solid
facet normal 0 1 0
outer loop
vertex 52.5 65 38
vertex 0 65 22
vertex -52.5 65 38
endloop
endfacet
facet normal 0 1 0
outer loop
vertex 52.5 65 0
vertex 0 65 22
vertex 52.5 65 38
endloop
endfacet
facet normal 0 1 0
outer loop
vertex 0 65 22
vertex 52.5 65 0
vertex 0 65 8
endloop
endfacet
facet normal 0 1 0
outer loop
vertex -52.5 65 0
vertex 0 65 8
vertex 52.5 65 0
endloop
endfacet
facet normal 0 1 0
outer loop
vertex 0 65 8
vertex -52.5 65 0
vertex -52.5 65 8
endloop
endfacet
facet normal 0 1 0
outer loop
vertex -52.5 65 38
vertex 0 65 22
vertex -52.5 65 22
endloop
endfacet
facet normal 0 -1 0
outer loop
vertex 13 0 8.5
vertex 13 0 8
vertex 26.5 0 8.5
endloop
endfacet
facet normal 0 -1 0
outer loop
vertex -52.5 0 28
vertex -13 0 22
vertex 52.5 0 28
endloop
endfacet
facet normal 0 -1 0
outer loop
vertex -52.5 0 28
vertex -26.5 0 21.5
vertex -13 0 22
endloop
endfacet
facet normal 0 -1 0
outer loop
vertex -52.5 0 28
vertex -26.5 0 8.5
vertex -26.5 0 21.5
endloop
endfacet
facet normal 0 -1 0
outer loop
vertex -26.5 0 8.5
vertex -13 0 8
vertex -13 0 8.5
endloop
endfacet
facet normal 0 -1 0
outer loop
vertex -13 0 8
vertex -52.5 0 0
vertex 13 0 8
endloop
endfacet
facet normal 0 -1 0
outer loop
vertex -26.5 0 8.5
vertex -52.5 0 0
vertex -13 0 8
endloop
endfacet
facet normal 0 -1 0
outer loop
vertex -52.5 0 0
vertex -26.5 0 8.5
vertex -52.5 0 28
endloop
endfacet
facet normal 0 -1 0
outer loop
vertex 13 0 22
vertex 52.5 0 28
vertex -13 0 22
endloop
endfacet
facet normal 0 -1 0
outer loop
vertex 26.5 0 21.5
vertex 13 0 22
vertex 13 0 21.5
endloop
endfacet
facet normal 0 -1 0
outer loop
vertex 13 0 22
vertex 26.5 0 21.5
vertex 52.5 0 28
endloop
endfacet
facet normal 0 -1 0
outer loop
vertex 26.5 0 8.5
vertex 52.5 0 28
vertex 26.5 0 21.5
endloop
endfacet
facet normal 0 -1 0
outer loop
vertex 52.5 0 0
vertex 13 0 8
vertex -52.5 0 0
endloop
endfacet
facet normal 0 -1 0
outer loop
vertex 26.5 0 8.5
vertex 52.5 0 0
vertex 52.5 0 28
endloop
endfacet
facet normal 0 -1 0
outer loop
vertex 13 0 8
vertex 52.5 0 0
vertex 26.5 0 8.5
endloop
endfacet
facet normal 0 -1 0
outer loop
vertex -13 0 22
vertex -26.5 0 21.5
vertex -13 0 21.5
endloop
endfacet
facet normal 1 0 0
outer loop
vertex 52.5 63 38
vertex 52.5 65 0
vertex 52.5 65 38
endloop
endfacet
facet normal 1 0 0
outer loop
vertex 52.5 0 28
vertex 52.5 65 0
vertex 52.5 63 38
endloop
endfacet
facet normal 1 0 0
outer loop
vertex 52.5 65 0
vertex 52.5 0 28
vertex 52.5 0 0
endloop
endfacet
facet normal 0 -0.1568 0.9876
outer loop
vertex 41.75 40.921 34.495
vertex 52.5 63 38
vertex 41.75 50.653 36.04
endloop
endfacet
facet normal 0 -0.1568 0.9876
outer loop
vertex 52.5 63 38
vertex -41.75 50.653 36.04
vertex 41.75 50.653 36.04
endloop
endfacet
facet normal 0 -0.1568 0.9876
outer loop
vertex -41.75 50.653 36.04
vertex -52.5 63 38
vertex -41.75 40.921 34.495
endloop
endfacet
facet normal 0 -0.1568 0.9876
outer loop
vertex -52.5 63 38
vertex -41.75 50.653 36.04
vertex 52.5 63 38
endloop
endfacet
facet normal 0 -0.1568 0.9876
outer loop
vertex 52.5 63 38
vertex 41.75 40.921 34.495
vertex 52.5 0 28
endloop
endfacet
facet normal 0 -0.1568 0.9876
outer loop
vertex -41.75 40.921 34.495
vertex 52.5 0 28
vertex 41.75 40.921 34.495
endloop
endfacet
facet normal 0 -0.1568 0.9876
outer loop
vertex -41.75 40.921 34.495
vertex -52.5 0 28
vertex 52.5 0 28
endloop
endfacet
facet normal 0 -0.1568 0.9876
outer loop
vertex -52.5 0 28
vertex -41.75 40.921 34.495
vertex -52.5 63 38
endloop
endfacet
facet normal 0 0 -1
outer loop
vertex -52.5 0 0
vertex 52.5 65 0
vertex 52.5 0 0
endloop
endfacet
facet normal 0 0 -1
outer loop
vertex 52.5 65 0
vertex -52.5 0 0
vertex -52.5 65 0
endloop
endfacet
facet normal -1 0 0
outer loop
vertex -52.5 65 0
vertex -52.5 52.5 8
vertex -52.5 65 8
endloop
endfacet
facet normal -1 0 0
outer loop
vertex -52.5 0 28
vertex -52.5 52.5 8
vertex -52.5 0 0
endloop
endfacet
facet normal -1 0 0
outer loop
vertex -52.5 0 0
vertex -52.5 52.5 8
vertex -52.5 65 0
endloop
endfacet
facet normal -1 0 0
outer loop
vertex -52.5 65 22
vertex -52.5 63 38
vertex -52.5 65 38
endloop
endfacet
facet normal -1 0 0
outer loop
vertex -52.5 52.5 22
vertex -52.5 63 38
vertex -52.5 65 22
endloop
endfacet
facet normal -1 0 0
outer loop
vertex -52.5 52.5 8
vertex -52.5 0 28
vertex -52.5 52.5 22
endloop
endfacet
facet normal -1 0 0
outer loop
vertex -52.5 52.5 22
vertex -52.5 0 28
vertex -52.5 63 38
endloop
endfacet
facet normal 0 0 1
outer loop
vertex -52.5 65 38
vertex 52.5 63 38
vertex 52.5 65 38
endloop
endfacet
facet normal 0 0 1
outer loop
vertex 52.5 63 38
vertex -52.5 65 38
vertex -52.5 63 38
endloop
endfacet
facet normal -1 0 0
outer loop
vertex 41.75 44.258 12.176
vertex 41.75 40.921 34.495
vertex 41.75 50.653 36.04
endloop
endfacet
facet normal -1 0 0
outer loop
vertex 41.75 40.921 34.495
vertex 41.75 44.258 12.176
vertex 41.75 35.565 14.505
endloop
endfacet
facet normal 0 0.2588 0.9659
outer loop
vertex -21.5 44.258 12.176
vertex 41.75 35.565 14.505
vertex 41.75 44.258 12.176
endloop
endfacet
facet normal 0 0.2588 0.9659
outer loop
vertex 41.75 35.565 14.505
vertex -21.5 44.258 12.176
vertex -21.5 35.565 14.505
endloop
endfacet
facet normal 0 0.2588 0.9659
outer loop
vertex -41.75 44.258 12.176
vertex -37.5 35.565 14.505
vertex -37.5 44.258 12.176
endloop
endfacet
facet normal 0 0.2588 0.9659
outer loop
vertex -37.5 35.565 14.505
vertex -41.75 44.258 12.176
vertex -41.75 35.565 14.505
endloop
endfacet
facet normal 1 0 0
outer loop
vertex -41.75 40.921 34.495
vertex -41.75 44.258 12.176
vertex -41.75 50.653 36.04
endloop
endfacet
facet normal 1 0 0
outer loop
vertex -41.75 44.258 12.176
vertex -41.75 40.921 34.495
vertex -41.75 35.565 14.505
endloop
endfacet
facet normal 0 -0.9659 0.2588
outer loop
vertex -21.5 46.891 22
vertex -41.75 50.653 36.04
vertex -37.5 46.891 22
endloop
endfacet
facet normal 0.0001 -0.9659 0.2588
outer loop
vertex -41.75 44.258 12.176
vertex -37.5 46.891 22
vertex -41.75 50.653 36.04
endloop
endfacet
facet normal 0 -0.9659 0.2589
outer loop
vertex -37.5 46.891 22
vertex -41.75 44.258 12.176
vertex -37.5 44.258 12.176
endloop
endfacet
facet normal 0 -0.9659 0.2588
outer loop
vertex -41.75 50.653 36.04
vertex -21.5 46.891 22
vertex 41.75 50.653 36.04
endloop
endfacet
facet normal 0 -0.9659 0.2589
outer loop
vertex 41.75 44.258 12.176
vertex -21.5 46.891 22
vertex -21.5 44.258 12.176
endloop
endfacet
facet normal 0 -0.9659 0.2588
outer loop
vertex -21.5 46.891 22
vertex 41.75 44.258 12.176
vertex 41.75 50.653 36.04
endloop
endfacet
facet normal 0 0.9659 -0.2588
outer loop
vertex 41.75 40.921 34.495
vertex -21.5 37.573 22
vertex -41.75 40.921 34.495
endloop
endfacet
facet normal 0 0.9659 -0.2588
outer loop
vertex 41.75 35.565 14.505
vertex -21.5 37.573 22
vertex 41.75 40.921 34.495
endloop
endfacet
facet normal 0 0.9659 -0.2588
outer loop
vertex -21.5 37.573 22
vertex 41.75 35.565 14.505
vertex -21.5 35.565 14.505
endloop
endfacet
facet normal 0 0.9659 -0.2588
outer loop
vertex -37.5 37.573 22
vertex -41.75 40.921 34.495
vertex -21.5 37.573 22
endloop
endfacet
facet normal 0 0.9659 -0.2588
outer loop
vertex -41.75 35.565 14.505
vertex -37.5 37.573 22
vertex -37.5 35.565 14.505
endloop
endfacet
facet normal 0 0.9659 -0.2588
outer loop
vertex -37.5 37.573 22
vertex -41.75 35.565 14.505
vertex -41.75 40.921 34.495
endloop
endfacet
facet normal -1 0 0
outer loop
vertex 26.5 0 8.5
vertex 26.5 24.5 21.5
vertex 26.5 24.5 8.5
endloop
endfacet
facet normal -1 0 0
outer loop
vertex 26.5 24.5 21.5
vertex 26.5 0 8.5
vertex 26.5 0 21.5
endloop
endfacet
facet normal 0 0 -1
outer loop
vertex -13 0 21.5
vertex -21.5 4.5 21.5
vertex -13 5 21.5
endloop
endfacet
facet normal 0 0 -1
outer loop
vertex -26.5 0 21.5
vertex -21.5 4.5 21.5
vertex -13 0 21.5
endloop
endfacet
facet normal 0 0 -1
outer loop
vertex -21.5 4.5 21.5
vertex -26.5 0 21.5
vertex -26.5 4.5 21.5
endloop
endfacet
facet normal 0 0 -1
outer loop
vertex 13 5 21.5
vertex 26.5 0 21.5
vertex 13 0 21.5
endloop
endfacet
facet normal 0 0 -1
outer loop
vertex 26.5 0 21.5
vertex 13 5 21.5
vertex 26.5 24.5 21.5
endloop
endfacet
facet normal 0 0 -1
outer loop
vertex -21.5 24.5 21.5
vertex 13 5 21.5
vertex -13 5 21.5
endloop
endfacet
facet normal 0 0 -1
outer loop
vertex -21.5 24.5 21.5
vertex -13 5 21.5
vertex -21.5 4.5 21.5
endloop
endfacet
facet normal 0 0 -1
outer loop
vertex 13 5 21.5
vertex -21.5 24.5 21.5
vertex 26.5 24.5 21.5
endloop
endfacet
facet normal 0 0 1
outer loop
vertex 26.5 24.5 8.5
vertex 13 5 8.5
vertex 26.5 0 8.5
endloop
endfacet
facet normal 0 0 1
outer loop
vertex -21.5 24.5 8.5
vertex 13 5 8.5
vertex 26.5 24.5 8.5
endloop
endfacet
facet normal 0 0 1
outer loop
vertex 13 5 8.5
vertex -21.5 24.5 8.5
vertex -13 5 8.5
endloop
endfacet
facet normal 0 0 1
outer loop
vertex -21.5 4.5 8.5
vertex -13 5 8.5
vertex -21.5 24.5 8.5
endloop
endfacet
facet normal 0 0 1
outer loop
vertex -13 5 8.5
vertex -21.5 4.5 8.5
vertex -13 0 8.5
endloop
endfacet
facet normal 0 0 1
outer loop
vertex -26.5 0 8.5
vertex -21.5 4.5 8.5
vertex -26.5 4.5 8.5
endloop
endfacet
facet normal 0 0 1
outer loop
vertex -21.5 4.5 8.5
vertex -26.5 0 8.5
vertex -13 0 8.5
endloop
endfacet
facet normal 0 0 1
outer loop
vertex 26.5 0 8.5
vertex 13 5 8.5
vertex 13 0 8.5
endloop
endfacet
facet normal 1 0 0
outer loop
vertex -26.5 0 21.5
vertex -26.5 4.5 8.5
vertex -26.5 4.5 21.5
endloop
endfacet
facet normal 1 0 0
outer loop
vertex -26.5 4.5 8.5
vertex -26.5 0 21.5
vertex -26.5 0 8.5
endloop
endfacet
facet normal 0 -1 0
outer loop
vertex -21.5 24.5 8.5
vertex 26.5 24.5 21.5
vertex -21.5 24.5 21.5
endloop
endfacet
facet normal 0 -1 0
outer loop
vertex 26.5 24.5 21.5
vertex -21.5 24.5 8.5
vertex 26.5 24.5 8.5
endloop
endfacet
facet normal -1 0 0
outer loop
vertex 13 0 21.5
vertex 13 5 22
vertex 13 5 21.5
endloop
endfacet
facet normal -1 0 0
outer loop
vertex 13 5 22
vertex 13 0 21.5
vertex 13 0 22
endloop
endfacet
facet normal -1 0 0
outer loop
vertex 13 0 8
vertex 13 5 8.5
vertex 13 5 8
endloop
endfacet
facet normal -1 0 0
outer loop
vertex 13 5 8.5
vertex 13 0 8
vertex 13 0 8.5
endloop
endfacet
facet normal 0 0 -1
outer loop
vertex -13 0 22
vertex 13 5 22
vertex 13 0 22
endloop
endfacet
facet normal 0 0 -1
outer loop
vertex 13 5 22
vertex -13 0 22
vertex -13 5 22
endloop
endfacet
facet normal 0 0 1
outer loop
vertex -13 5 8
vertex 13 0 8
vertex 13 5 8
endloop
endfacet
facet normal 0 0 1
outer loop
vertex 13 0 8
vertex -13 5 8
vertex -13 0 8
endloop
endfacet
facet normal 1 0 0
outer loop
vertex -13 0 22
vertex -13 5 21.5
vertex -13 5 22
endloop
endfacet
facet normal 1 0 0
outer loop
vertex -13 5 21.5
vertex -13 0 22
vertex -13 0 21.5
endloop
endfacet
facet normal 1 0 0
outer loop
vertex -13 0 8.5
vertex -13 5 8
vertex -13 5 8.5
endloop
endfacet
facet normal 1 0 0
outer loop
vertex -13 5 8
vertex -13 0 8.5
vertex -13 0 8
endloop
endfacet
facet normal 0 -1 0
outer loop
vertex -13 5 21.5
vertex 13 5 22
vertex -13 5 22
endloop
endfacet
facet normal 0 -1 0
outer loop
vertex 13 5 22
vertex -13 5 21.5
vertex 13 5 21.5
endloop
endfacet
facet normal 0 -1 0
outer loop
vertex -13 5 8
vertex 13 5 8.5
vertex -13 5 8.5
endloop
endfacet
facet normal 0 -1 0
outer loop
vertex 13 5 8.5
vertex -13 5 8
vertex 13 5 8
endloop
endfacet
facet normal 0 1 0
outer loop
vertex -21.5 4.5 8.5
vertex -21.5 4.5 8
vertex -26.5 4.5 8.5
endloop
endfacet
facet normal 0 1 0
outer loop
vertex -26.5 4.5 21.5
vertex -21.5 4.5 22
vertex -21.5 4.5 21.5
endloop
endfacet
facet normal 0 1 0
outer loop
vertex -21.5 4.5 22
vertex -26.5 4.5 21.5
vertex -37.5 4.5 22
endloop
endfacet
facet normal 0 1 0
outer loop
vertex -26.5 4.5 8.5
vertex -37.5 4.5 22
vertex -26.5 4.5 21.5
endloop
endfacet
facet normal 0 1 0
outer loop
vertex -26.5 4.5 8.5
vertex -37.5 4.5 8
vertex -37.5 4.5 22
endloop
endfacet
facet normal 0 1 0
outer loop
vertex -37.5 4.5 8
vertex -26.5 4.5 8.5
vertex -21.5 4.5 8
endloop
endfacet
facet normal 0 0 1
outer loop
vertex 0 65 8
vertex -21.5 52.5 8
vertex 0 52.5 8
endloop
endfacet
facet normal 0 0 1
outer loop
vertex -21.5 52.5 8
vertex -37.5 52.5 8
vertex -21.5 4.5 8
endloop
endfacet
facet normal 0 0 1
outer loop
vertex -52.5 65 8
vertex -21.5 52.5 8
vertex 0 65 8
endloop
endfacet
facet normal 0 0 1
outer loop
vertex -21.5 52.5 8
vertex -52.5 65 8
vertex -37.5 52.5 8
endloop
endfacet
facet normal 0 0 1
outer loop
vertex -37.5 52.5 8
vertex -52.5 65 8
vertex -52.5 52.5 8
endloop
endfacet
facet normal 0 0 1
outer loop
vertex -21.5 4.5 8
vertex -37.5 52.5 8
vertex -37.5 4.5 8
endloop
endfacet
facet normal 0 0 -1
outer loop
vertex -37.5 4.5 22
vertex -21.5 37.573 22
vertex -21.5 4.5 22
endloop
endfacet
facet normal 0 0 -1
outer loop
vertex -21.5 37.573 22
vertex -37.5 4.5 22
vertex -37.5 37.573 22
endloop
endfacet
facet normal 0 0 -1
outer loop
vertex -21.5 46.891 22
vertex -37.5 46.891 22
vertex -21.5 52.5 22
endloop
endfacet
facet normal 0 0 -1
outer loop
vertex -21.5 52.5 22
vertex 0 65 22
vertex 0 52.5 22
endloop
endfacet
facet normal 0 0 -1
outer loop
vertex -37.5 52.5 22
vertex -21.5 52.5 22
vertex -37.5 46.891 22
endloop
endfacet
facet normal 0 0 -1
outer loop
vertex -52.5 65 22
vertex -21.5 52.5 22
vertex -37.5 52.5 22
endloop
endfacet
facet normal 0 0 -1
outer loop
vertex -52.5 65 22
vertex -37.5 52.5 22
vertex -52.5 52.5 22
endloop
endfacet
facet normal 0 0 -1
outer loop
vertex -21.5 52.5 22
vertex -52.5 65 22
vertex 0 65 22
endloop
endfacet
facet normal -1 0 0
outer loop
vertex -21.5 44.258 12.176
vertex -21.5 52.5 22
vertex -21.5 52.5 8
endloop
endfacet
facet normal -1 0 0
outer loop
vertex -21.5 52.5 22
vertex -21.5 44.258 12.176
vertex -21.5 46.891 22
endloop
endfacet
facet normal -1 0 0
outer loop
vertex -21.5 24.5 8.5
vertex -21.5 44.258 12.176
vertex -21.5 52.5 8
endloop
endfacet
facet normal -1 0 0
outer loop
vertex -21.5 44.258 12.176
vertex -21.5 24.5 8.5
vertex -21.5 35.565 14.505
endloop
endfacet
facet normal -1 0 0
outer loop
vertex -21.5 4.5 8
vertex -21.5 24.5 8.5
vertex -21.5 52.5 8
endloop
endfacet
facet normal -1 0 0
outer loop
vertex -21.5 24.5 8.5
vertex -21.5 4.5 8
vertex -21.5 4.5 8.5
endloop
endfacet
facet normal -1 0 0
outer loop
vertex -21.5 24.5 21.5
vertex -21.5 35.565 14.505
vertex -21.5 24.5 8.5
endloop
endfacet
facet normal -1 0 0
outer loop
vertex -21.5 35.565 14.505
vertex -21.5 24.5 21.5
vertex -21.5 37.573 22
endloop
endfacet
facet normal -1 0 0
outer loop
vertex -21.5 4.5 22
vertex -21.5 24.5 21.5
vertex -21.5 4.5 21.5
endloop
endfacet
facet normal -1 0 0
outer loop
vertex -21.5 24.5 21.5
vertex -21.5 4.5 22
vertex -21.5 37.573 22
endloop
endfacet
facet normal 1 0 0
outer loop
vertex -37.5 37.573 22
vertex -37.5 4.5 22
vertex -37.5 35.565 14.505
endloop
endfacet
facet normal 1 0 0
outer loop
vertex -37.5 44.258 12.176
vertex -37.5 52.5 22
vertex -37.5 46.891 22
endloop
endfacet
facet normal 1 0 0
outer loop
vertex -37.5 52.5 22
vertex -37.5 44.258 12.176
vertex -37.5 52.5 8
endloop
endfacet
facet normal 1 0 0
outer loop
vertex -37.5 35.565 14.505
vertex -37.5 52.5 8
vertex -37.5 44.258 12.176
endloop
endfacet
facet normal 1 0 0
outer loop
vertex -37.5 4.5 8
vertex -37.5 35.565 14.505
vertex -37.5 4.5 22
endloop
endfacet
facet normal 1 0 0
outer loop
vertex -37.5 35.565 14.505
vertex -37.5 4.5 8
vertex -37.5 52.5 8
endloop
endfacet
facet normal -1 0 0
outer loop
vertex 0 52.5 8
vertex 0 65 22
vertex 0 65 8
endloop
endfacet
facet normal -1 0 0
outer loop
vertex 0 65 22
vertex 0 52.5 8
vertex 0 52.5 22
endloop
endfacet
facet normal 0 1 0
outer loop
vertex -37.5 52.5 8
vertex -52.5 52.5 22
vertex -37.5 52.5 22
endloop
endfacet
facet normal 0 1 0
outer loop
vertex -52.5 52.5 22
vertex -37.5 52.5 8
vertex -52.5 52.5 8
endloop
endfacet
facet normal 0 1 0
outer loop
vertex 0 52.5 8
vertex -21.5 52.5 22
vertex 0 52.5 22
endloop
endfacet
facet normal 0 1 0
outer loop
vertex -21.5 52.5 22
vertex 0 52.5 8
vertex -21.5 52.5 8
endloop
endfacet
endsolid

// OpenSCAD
/*
    💎 GradMon Case v3.0
    Minimal, support-free stand for PSA/BGS graded cards.
    Features an open "Side Corridor" for easy USB cable management.
*/

// --- SETTINGS ---
$fn = 64;

// Card dimensions (Slabs)
card_width = 83.5;
card_depth = 9.0;    
card_height_vis = 25; 

// ESP32 Module (Heltec WiFi Kit 32 V3)
esp_w = 51.0;
esp_d = 26.5;
esp_h = 11.0;
oled_w = 26.0;
oled_h = 14.0;

// USB Corridor dimensions
corridor_w = 16; 
corridor_h = 14;

// Base dimensions
base_w = 105;
base_d = 65;
base_h = 38;
angle = 15; 

module case() {
    difference() {
        // --- 1. EXTERNAL SHELL ---
        union() {
            hull() {
                // Front slanted face
                translate([-base_w/2, 0, 0]) cube([base_w, 2, 28]);
                // Back face
                translate([-base_w/2, base_d-2, 0]) cube([base_w, 2, base_h]);
                // Bottom plate
                translate([-base_w/2, 0, 0]) cube([base_w, base_d, 2]);
            }
        }

        // --- 2. CARD SLOT ---
        // Slanted slot to hold the slab
        translate([0, base_d/2 + 10, base_h - card_height_vis + 10])
        rotate([-angle, 0, 0])
        translate([-card_width/2, -card_depth/2, -10])
        cube([card_width, card_depth, 100]);

        // --- 3. ESP32 CAVITY & OLED WINDOW ---
        // Main cavity for the board
        translate([0, 12, 15])
        cube([esp_w + 2, 25, esp_h + 2], center=true);
        
        // Window for the OLED screen
        translate([0, -5, 15])
        cube([oled_w, 20, oled_h], center=true);

        // --- 4. USB "CORRIDOR" ---
        // Cutout from the side port (left) straight to the back
        hull() {
            // Starting at the port location (left end of board)
            translate([-esp_w/2 - corridor_w/4, 12, 15])
            cube([corridor_w, 15, corridor_h], center=true);
            
            // Ending at the rear face
            translate([-esp_w/2 - corridor_w/4, base_d, 15])
            cube([corridor_w, 1, corridor_h], center=true);
        }
        
        // Extra clearance for the cable bend at the back
        translate([-base_w/4, base_d-5, 15])
        cube([base_w/2, 15, corridor_h], center=true);
    }
}

case();

// --- PRINTING INFO ---
/*
    - Support: NOT REQUIRED
    - Orientation: Print on bottom face (as oriented in OpenSCAD)
    - Infill: 15%
    - Material: PLA is perfect.
*/
